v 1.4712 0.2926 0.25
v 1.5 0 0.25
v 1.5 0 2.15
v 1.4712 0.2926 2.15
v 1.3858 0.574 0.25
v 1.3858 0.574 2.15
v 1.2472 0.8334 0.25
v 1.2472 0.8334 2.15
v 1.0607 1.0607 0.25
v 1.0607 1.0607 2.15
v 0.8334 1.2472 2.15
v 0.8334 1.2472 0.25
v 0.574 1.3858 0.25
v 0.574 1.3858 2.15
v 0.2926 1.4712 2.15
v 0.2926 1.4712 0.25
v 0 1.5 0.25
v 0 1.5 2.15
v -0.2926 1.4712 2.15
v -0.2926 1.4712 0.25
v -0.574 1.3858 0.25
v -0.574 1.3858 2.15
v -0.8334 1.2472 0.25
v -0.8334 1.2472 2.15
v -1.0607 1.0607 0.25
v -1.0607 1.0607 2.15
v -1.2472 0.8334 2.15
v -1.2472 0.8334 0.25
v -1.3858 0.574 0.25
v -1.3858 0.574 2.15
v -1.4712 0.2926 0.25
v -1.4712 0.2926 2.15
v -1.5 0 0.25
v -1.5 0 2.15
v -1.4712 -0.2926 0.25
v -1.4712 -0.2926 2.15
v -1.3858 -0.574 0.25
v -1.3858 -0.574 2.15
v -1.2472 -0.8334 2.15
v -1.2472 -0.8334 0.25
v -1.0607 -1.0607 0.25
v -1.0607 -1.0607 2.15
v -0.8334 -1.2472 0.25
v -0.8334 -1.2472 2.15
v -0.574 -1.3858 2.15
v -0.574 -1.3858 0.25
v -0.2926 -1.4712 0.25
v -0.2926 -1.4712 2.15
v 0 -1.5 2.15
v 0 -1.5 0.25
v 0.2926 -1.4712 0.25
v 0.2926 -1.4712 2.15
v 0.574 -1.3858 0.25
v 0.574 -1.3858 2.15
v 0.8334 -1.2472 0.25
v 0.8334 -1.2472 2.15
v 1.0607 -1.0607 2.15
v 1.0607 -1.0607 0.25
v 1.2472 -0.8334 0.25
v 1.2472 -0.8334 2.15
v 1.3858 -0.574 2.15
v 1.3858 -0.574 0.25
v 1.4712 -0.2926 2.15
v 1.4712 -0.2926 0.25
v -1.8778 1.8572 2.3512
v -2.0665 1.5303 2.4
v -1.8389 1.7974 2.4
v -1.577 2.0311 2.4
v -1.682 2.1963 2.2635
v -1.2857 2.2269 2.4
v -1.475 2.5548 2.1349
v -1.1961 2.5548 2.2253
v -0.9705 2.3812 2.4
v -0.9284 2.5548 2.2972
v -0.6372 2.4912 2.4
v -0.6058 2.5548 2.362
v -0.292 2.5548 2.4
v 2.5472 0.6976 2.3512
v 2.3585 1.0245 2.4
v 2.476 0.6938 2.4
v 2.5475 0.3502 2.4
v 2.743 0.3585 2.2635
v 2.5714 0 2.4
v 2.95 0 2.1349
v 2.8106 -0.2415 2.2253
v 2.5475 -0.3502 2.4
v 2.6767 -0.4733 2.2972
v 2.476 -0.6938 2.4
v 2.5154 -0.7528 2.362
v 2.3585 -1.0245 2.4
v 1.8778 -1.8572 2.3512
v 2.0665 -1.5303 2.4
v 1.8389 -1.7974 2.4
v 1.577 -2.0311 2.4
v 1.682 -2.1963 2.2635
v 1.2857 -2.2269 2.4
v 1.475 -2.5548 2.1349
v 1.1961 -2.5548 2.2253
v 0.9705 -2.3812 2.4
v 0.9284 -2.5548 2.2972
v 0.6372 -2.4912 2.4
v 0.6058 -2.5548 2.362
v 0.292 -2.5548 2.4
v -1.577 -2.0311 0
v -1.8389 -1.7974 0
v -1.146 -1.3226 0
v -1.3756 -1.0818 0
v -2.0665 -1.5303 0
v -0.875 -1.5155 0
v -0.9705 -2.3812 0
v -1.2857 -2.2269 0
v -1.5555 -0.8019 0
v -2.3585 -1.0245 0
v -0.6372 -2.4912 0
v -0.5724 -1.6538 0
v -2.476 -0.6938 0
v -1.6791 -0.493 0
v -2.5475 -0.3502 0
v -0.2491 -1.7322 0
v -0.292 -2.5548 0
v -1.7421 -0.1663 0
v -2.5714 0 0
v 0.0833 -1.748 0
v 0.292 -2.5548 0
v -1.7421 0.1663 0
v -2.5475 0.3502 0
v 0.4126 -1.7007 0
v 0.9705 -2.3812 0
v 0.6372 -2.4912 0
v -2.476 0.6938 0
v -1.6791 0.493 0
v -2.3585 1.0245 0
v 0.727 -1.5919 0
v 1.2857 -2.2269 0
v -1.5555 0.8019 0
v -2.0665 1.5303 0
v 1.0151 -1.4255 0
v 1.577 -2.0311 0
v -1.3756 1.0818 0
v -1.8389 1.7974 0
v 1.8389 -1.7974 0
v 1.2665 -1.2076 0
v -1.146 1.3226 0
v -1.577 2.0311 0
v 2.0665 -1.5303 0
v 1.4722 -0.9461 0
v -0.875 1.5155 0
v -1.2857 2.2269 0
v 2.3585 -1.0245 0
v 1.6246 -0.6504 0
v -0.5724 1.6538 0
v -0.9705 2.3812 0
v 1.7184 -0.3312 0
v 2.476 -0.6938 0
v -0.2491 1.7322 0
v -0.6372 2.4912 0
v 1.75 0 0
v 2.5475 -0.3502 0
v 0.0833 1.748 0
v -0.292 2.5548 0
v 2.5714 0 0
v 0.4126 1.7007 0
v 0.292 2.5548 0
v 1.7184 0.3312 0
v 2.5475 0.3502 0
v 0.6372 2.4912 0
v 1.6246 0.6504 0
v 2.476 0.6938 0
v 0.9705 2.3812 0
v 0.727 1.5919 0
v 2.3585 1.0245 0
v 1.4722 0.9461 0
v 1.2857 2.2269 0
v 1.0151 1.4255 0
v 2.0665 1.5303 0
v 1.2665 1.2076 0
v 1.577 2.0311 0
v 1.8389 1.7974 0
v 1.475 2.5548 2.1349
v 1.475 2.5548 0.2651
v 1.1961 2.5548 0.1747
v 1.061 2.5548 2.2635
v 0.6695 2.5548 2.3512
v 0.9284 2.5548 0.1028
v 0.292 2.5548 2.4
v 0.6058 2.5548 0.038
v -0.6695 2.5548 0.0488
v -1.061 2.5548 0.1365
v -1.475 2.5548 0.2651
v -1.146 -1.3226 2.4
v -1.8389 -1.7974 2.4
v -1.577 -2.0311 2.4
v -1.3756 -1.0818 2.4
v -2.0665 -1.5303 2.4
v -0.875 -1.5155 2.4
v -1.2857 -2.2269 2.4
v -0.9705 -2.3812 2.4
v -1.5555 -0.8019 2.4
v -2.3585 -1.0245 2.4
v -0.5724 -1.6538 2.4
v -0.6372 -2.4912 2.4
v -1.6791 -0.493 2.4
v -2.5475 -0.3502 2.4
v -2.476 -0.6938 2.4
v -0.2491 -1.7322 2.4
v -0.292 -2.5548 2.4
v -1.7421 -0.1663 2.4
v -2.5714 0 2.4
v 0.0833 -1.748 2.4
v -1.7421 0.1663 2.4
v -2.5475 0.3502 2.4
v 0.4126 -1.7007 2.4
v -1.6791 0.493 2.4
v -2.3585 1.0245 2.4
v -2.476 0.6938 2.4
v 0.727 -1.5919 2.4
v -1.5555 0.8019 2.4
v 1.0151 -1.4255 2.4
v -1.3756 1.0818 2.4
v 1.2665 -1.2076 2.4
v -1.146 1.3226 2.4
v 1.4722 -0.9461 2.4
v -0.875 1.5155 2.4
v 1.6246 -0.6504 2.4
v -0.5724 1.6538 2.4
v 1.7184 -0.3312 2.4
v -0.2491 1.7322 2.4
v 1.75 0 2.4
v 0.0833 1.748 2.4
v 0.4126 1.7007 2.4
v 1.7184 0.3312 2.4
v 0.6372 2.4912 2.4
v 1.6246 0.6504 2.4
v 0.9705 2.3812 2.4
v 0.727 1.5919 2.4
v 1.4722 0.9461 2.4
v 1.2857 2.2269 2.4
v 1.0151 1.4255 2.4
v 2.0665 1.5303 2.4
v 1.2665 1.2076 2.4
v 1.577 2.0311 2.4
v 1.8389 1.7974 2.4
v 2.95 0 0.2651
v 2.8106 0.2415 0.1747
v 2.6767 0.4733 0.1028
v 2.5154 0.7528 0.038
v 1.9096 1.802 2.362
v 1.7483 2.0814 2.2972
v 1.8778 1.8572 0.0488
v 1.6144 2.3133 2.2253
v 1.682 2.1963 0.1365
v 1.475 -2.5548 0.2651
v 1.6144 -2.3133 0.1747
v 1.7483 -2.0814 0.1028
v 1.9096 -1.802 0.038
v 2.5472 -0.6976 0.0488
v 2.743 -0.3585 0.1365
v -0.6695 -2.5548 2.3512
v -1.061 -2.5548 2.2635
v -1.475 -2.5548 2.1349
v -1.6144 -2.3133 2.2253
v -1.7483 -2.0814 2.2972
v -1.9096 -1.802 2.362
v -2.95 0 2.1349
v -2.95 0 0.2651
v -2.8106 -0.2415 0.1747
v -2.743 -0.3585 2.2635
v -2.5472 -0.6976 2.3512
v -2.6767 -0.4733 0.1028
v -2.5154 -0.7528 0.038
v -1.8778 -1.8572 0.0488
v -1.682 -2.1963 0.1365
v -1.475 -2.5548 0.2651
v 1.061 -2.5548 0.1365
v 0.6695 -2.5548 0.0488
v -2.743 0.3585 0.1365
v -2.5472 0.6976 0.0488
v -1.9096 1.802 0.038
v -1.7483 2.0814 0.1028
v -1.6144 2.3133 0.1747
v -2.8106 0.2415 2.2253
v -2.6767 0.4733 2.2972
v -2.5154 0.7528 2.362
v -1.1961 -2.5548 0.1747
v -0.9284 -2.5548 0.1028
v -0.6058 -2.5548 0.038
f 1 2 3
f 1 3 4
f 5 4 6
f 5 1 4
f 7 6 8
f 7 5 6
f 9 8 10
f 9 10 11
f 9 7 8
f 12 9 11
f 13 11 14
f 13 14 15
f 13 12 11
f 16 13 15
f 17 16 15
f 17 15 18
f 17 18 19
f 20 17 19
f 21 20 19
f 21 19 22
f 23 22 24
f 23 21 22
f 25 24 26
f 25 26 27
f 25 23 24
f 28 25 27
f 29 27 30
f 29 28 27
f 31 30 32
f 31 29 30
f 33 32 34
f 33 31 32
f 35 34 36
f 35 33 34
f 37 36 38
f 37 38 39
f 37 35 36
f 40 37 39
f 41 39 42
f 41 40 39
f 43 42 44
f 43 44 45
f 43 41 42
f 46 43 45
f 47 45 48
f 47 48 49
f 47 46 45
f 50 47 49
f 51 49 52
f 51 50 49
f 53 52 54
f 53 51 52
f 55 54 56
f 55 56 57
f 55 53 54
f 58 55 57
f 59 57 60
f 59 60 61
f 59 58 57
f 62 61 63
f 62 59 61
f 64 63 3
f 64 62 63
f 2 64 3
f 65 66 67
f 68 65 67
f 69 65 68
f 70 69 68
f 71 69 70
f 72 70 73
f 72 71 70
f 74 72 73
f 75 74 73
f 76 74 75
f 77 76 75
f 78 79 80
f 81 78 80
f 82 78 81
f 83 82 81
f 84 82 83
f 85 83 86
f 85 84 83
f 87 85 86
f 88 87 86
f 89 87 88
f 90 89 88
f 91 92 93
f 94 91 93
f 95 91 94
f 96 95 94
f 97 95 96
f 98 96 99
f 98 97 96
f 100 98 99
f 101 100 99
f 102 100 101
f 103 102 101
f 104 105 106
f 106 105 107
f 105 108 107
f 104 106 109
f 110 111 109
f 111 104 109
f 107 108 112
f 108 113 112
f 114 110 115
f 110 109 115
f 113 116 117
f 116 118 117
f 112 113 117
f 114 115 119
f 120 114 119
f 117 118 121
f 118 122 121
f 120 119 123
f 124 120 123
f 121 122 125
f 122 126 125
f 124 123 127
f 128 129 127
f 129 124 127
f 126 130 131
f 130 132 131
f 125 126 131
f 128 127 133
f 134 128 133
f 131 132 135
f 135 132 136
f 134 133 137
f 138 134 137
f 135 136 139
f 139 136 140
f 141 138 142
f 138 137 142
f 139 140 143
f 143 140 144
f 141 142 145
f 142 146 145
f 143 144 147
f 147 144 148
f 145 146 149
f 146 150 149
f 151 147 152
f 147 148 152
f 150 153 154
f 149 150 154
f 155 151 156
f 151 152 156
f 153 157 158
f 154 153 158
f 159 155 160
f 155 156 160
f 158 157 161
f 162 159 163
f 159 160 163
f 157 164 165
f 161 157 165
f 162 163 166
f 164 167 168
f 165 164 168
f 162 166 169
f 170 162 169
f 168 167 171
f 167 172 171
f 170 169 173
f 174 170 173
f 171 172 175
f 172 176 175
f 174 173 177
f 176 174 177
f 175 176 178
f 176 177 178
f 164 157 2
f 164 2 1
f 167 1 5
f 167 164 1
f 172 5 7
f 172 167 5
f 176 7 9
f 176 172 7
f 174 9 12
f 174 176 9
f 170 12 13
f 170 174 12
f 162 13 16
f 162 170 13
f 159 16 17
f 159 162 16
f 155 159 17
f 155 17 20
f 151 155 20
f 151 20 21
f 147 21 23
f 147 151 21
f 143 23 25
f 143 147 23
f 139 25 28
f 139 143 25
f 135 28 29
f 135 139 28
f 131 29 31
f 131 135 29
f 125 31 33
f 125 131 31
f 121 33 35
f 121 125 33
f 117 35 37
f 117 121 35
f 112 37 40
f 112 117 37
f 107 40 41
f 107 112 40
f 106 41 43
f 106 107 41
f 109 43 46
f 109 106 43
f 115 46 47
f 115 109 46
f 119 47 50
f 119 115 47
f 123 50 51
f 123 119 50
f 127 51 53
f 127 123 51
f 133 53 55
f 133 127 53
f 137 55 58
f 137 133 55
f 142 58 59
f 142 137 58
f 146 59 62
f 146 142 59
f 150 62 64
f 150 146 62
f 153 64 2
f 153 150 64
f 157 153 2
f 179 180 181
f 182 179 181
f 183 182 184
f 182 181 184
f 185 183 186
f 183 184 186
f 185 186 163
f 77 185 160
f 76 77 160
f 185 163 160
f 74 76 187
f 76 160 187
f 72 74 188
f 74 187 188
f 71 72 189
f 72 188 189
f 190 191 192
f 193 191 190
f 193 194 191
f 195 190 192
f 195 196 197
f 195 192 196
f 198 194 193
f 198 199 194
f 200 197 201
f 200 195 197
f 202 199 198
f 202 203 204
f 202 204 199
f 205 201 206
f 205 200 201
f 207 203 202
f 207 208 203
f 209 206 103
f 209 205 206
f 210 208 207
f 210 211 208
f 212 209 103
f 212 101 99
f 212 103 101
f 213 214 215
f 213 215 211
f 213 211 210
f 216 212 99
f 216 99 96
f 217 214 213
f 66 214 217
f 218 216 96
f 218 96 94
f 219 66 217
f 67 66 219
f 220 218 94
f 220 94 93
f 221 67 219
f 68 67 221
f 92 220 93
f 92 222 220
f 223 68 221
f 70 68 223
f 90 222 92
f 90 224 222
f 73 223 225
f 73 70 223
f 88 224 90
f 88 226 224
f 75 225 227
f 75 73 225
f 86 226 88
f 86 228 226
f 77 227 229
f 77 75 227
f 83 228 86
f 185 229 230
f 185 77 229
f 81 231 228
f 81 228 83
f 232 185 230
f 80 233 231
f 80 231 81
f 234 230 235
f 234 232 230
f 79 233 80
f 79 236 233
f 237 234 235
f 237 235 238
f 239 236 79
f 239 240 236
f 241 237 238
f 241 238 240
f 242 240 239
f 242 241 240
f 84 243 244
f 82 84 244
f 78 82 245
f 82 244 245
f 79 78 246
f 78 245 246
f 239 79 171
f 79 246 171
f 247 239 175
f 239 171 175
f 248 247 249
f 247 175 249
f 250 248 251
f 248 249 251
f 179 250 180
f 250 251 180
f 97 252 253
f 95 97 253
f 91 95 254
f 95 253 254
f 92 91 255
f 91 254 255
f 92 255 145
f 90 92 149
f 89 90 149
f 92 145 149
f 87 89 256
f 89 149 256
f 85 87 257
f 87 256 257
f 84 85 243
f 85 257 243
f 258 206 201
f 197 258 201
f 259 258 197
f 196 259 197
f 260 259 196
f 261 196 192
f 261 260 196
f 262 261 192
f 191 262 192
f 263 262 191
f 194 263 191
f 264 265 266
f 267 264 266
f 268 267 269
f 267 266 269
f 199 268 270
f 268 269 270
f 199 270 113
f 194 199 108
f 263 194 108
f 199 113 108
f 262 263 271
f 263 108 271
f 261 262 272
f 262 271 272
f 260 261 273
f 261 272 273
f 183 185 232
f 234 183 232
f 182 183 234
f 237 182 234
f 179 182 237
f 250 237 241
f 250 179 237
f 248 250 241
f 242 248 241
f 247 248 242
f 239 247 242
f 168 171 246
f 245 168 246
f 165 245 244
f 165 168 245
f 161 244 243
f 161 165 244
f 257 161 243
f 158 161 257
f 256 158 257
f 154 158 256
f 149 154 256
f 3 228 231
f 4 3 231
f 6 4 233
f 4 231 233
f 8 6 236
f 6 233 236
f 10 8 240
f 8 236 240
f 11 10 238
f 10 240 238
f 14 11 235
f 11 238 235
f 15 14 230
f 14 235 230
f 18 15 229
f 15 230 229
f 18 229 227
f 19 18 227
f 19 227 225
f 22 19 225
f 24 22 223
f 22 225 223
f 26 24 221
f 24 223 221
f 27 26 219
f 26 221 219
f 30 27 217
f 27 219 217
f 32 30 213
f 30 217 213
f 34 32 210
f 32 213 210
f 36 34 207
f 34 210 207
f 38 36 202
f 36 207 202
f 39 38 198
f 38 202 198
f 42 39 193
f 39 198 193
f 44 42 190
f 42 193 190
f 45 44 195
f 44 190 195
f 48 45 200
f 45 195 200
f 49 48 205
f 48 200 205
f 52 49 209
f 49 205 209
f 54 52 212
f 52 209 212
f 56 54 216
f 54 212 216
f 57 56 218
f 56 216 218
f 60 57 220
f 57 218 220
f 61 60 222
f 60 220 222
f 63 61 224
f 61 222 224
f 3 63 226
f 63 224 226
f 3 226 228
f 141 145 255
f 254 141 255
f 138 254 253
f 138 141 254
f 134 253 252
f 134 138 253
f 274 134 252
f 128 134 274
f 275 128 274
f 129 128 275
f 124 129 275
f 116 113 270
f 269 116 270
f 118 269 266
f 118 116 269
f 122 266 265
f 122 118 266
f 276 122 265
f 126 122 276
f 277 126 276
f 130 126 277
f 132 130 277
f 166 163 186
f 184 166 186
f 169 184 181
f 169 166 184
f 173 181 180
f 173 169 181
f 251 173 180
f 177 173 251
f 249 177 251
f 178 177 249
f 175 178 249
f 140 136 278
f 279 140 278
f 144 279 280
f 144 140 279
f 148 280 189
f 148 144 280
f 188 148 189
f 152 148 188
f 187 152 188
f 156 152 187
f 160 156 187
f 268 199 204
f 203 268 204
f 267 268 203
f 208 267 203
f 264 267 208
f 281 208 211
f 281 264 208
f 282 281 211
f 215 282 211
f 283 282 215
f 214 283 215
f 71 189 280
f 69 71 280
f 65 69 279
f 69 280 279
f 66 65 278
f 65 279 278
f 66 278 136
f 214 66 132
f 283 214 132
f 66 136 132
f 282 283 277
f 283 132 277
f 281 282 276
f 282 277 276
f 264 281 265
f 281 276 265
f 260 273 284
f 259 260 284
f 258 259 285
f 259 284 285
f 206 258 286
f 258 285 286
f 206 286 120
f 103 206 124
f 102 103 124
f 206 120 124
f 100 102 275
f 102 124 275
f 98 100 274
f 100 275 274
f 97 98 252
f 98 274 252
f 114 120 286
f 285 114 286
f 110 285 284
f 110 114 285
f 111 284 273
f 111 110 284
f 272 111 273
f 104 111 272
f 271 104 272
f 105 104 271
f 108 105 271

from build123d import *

# Parameters (mm, degrees)
SKETCH1_R           = 1.5
BOSS_EXTRUDE1_DEPTH = 2.4
CHAMFER1_SIZE       = 0.25


with BuildPart() as part:
    # Sketch1 → Boss-Extrude1 (new body)
    with BuildSketch(Plane.XY):
        Polygon((2.95, 0), (1.475, 2.554774941), (-1.475, 2.554774941), (-2.95, 0), (-1.475, -2.554774941), (1.475, -2.554774941), align=None)
        Circle(SKETCH1_R, mode=Mode.SUBTRACT)
    extrude(amount=BOSS_EXTRUDE1_DEPTH)

    # Chamfer1
    chamfer1_edges = [part.edges().sort_by_distance(p)[0] for p in [
        (-1.5, 0, 0),
        (-1.5, 0, 2.4),
    ]]
    chamfer(chamfer1_edges, length=CHAMFER1_SIZE)

    # Sketch2 → Cut-Revolve1 (revolve, cut)
    with BuildSketch(Plane(origin=(0, 0, 0), x_dir=(1, 0, 0), z_dir=(0, 1, 0))):
        Polygon((-1, -2.45), (-2.5, -2.45), (-3.132844885, -2.006877241), (-3.132844885, -0.393122759), (-2.5, 0.05), (-1, 0.05), (-1, 1.98132807), (-7.750900281, 1.98132807), (-7.750900281, -6.982873217), (-1, -6.982873217), align=None)
    revolve(axis=Axis((0, 0, 2.45), (0, 0, -1)), mode=Mode.SUBTRACT)


solid = part.part
